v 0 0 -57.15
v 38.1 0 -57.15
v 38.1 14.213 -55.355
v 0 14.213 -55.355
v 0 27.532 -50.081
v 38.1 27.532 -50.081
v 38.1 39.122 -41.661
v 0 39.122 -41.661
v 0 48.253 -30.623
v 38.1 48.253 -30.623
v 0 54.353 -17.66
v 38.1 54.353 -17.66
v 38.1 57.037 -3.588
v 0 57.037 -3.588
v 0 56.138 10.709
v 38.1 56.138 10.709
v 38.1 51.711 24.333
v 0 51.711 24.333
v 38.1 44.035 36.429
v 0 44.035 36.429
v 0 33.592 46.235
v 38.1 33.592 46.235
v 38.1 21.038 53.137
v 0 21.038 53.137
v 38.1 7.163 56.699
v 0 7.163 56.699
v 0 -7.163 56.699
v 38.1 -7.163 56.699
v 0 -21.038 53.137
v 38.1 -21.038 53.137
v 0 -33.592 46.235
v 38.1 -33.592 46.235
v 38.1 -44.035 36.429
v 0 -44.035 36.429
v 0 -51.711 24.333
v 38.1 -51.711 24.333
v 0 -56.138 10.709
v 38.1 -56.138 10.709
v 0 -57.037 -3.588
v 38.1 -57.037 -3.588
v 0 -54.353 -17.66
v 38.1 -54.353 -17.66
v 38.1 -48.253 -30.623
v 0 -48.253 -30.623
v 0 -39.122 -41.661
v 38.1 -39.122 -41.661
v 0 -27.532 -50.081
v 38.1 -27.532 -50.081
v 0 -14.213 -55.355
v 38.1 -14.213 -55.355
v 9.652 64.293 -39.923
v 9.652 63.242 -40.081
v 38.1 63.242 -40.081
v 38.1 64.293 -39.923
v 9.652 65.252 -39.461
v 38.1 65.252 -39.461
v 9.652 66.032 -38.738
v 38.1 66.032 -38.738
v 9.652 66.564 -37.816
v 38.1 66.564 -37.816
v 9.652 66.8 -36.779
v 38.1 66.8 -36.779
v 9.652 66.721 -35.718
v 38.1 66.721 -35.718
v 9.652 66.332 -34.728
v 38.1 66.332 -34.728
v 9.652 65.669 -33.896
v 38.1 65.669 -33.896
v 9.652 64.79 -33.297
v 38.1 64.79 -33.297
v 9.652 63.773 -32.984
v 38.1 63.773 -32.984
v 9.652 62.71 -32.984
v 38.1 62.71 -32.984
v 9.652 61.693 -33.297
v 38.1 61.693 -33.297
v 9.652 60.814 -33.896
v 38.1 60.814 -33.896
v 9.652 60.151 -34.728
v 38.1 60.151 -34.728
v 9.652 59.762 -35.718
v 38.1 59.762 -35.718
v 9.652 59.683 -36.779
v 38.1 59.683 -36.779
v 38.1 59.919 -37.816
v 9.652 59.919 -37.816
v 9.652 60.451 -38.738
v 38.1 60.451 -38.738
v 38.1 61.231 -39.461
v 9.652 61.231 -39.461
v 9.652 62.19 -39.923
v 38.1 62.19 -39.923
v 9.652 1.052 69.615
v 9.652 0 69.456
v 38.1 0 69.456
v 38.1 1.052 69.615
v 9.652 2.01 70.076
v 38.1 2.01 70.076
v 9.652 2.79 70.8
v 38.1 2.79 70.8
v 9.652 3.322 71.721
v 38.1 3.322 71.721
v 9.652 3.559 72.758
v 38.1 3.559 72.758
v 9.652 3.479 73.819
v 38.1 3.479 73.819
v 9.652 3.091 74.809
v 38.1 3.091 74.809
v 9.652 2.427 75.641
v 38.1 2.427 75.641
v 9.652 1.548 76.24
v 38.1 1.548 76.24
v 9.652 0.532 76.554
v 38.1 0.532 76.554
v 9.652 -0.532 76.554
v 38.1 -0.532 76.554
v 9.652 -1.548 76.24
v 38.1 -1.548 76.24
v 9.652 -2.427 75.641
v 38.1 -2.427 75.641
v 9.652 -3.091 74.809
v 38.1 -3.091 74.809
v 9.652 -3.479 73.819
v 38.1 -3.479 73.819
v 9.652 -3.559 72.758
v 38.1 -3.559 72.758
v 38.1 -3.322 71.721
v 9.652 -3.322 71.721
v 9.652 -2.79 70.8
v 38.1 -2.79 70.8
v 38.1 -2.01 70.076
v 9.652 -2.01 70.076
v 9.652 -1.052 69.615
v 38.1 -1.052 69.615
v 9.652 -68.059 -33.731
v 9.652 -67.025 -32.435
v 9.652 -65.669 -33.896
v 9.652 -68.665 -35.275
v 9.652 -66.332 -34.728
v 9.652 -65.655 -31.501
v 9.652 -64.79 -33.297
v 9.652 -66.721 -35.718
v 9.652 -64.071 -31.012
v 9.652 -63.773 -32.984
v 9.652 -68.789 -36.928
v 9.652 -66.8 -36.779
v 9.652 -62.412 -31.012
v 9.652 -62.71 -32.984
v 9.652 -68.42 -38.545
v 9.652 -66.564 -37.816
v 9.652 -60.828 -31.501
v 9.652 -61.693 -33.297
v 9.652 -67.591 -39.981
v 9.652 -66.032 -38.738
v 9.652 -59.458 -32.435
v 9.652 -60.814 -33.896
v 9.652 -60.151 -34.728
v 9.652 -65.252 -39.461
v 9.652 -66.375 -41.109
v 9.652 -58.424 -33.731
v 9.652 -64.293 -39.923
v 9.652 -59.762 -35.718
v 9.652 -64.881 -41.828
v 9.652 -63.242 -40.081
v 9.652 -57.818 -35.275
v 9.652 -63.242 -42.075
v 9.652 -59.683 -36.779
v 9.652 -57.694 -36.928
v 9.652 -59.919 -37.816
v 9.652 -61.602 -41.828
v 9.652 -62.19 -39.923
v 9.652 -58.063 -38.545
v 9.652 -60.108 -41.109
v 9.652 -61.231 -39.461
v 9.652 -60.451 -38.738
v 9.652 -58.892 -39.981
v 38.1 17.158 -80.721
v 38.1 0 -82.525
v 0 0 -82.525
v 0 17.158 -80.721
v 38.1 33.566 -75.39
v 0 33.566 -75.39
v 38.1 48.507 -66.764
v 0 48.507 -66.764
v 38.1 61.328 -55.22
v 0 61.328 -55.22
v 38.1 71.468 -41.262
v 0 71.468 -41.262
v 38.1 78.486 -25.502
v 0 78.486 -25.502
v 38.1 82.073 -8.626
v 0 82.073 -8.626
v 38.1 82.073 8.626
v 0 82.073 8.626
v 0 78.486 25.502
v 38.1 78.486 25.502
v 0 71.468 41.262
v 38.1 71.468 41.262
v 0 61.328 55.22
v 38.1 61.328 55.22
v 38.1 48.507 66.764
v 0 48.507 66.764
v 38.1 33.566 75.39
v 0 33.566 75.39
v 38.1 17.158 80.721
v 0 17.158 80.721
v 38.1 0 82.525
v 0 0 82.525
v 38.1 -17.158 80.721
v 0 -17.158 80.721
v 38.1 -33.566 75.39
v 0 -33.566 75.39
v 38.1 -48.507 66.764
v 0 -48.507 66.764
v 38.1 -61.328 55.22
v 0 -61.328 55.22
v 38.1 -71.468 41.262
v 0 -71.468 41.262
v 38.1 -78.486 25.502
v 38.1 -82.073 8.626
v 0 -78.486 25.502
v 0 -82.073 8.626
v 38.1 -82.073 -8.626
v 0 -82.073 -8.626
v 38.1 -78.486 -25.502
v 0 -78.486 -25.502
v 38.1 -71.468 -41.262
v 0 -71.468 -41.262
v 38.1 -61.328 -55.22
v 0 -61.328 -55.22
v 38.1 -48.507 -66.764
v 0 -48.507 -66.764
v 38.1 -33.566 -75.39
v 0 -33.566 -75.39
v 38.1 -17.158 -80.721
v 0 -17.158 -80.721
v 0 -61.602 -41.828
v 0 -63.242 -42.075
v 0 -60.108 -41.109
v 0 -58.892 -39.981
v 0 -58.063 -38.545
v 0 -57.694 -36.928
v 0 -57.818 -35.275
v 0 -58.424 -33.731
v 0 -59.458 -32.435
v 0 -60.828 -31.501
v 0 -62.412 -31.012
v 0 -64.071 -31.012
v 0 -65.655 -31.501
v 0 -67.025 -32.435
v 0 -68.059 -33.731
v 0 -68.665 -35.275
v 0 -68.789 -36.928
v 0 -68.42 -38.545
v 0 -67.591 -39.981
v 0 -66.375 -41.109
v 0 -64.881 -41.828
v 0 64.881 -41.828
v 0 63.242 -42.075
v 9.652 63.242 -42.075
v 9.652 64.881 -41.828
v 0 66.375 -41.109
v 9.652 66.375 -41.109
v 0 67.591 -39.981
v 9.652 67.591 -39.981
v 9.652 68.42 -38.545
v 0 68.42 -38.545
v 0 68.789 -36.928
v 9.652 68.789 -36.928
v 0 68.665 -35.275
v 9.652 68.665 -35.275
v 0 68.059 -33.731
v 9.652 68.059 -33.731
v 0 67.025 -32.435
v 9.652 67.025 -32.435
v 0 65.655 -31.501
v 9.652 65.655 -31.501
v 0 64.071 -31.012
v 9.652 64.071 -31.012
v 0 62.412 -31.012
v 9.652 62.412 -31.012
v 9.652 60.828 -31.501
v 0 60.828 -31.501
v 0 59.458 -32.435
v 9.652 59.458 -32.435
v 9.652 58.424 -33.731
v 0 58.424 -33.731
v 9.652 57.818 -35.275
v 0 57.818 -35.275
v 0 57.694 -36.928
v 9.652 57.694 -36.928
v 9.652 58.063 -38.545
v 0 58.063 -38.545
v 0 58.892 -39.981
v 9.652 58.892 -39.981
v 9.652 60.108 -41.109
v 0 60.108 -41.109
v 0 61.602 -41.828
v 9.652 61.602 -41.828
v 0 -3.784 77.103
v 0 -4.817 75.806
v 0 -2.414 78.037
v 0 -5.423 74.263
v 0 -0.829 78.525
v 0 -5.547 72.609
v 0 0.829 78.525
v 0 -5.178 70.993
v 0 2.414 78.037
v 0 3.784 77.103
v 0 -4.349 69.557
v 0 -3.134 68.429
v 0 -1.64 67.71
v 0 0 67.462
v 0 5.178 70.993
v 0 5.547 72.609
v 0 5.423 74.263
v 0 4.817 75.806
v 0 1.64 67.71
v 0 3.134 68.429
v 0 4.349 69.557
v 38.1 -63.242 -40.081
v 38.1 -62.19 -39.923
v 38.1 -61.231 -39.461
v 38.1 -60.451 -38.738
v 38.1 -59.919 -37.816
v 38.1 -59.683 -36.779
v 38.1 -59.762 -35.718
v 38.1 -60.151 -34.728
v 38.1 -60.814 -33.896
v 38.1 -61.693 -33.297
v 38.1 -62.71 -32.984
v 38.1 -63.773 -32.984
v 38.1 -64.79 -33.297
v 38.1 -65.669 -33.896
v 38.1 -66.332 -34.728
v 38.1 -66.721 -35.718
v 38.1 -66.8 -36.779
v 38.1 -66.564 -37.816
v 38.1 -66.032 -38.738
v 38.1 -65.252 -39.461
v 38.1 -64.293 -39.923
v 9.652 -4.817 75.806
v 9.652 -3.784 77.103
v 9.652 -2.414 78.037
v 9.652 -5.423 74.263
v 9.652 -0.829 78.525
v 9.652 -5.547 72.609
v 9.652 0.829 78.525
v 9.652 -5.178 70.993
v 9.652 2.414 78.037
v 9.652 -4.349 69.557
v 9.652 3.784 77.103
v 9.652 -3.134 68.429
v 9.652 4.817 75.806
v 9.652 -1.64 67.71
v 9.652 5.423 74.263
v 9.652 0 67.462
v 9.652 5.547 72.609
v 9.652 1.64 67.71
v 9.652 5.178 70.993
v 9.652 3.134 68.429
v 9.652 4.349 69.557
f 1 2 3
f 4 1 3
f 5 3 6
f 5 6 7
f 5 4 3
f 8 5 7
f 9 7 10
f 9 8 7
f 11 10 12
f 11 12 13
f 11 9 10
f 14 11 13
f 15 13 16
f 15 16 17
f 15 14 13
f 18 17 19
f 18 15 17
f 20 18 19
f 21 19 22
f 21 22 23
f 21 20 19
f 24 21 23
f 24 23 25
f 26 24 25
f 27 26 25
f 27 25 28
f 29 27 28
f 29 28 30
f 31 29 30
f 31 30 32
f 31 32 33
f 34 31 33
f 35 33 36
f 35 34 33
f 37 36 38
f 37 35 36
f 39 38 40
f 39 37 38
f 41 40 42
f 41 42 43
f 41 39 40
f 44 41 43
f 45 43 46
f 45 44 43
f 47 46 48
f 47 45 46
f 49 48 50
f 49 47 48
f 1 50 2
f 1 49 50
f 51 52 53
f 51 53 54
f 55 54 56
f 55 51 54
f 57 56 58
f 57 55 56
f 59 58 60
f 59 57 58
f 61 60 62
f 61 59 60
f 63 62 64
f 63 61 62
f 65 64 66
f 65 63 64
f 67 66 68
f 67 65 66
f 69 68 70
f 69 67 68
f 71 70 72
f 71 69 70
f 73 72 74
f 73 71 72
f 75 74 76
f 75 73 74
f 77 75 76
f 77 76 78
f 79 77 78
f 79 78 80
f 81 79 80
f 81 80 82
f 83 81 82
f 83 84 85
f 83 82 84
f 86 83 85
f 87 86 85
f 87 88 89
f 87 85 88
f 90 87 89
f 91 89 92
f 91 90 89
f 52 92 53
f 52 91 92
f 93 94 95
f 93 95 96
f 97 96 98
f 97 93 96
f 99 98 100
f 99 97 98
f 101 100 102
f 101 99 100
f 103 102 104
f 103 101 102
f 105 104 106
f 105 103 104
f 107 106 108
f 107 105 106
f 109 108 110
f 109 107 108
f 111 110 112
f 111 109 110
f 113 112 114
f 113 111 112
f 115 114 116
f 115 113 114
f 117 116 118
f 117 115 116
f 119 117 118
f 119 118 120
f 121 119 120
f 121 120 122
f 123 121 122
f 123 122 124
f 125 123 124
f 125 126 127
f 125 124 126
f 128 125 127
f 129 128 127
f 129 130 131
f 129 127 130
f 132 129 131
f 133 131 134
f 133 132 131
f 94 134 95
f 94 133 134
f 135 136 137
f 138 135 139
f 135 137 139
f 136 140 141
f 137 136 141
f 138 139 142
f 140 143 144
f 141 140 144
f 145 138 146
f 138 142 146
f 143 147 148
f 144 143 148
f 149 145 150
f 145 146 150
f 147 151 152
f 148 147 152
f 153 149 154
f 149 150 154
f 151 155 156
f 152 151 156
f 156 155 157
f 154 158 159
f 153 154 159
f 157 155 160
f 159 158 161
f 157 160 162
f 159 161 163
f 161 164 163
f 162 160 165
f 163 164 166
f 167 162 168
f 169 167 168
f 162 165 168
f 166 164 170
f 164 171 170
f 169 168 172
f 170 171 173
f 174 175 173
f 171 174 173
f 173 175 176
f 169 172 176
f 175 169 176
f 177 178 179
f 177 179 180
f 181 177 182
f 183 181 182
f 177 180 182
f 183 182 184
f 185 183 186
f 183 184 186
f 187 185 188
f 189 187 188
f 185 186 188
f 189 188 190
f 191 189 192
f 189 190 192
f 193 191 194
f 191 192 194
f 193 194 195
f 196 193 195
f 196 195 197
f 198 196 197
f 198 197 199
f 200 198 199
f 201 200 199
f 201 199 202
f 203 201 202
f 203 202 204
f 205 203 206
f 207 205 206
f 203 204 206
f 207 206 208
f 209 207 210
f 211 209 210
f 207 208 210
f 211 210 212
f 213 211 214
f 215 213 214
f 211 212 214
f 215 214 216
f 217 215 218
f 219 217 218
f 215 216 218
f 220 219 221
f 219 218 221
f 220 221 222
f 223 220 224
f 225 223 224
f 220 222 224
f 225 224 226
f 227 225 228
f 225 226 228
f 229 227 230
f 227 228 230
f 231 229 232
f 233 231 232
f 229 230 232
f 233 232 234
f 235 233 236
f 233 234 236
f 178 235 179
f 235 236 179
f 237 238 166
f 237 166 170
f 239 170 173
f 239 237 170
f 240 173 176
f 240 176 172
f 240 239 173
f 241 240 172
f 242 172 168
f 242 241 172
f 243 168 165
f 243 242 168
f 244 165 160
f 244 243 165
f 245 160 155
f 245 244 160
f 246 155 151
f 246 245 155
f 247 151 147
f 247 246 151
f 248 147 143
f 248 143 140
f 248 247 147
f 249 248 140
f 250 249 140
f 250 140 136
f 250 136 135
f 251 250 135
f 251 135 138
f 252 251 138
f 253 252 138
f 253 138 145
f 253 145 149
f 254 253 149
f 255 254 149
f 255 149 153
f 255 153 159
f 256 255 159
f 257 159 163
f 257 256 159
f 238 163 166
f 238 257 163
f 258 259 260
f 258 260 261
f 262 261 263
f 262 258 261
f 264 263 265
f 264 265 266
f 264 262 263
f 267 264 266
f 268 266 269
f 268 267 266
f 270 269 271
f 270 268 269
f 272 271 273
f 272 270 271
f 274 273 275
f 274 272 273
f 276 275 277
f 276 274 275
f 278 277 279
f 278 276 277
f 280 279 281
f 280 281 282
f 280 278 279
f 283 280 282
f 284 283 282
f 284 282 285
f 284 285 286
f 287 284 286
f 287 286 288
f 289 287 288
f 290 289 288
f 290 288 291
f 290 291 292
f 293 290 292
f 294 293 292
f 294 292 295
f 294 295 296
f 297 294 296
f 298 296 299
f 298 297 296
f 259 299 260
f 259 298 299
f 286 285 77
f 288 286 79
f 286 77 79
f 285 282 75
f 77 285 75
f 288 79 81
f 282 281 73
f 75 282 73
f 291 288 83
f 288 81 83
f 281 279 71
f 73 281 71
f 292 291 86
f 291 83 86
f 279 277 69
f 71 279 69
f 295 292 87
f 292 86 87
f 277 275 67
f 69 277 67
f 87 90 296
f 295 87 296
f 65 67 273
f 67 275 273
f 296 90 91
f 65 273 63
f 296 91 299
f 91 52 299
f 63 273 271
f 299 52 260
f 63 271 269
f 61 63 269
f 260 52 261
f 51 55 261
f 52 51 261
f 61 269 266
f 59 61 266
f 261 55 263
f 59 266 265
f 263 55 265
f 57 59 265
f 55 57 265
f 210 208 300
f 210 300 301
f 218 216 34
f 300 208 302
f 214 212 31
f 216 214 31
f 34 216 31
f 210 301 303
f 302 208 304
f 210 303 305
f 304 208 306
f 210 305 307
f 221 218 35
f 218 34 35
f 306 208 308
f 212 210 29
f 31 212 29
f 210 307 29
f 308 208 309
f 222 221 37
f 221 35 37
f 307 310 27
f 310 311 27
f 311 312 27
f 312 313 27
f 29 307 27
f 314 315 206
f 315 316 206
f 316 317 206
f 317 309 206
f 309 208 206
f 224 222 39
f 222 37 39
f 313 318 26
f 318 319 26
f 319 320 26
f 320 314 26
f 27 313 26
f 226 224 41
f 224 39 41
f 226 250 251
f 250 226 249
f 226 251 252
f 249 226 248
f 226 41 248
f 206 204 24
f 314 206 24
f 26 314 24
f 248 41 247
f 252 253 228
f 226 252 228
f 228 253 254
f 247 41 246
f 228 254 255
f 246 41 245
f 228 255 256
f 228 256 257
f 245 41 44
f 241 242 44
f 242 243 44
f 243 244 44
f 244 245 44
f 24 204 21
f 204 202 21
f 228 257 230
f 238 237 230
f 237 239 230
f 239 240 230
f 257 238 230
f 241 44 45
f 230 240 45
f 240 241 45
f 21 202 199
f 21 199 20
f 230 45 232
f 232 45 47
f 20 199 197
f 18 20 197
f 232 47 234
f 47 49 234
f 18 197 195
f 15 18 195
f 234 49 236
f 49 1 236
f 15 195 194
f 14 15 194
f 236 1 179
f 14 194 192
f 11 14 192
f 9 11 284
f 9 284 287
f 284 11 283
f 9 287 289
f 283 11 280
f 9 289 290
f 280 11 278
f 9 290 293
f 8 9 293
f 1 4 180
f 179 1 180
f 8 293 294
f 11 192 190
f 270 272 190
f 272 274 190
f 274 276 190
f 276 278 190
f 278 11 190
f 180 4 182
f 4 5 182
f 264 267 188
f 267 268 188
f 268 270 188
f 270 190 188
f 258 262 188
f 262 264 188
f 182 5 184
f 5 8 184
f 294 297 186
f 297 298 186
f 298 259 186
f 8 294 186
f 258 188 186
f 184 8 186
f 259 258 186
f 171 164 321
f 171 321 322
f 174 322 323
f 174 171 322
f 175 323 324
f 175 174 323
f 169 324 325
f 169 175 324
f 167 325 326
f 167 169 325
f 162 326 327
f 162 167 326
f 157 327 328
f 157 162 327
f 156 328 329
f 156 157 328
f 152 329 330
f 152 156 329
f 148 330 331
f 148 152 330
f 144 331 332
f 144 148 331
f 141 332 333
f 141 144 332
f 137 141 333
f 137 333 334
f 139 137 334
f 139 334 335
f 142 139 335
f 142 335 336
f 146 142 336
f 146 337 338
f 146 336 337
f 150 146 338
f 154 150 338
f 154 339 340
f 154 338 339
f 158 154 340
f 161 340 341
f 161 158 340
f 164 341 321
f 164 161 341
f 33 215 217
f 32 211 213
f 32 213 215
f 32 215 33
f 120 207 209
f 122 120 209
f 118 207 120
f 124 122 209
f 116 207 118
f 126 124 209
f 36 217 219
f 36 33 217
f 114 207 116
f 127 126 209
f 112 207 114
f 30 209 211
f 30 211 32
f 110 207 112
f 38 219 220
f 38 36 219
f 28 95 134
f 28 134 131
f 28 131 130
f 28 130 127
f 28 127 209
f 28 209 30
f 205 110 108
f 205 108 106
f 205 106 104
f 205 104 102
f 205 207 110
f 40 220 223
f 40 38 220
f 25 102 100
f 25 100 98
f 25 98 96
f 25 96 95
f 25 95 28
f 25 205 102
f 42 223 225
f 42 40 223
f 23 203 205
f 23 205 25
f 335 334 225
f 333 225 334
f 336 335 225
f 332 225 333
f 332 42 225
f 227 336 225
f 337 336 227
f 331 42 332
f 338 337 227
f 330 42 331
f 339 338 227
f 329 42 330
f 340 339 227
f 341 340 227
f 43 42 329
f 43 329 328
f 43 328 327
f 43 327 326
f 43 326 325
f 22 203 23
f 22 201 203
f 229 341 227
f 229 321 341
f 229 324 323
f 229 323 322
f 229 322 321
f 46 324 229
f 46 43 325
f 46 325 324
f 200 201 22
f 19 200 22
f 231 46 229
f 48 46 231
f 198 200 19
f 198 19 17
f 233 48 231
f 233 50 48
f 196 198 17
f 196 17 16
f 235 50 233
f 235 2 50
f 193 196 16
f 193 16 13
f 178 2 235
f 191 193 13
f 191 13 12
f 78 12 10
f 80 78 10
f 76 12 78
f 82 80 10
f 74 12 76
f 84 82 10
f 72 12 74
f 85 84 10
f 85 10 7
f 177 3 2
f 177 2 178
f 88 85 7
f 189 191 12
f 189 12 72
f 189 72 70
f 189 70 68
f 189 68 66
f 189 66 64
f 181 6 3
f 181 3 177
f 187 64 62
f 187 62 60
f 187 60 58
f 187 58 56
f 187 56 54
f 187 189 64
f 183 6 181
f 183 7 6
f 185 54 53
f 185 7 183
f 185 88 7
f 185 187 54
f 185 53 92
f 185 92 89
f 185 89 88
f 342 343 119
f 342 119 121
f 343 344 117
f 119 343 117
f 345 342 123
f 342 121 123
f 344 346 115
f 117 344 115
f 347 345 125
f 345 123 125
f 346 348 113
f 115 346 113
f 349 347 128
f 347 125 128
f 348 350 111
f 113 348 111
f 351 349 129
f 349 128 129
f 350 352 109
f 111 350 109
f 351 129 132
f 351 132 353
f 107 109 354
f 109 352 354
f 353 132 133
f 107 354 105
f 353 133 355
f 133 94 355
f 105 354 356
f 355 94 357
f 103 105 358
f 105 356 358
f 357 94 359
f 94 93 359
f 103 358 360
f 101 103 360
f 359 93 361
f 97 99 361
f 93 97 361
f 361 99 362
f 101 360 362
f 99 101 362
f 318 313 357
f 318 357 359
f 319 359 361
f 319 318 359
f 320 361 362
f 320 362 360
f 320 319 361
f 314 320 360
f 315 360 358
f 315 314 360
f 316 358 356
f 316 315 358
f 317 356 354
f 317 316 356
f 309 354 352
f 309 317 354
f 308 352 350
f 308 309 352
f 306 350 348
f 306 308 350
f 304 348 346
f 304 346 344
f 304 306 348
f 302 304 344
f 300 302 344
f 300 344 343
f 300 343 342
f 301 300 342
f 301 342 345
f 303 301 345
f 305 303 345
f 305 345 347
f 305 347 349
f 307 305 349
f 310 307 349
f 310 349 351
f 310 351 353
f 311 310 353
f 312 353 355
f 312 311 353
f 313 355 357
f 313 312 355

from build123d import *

# Parameters (mm, degrees)
SKETCH1_R           = 82.5246
BOSS_EXTRUDE1_DEPTH = 38.1
SKETCH2_R           = 57.15
CUT_EXTRUDE1_DEPTH  = 38.1
SKETCH3_R           = 3.5687
CUT_EXTRUDE3_DEPTH  = 123.769007532
SKETCH4_R           = 5.5626
CUT_EXTRUDE4_DEPTH  = 9.652


with BuildPart() as part:
    # Sketch1 → Boss-Extrude1 (new body)
    with BuildSketch(Plane.YZ):
        with Locations(Location((0, 0, 0), (0, 0, 270))):
            Circle(SKETCH1_R)
    extrude(amount=BOSS_EXTRUDE1_DEPTH)

    # Sketch2 → Cut-Extrude1 (cut)
    with BuildSketch(Plane.YZ):
        with Locations(Location((0, 0, 0), (0, 0, 270))):
            Circle(SKETCH2_R)
    extrude(amount=CUT_EXTRUDE1_DEPTH, mode=Mode.SUBTRACT)

    # Sketch3 → Cut-Extrude3 (cut, through all)
    with BuildSketch(Plane.YZ):
        with Locations(Location((0, 73.025, 0), (0, 0, 270))):
            Circle(SKETCH3_R)
        with Locations(Location((-63.241505111, -36.5125, 0), (0, 0, 270))):
            Circle(SKETCH3_R)
        with Locations(Location((63.241505111, -36.5125, 0), (0, 0, 270))):
            Circle(SKETCH3_R)
    extrude(amount=CUT_EXTRUDE3_DEPTH, mode=Mode.SUBTRACT)

    # Sketch4 → Cut-Extrude4 (cut)
    with BuildSketch(Plane.YZ):
        with Locations(Location((0, 73.025, 0), (0, 0, 270))):
            Circle(SKETCH4_R)
        with Locations(Location((-63.241505111, -36.5125, 0), (0, 0, 270))):
            Circle(SKETCH4_R)
        with Locations(Location((63.241505111, -36.5125, 0), (0, 0, 270))):
            Circle(SKETCH4_R)
    extrude(amount=CUT_EXTRUDE4_DEPTH, mode=Mode.SUBTRACT)


solid = part.part
